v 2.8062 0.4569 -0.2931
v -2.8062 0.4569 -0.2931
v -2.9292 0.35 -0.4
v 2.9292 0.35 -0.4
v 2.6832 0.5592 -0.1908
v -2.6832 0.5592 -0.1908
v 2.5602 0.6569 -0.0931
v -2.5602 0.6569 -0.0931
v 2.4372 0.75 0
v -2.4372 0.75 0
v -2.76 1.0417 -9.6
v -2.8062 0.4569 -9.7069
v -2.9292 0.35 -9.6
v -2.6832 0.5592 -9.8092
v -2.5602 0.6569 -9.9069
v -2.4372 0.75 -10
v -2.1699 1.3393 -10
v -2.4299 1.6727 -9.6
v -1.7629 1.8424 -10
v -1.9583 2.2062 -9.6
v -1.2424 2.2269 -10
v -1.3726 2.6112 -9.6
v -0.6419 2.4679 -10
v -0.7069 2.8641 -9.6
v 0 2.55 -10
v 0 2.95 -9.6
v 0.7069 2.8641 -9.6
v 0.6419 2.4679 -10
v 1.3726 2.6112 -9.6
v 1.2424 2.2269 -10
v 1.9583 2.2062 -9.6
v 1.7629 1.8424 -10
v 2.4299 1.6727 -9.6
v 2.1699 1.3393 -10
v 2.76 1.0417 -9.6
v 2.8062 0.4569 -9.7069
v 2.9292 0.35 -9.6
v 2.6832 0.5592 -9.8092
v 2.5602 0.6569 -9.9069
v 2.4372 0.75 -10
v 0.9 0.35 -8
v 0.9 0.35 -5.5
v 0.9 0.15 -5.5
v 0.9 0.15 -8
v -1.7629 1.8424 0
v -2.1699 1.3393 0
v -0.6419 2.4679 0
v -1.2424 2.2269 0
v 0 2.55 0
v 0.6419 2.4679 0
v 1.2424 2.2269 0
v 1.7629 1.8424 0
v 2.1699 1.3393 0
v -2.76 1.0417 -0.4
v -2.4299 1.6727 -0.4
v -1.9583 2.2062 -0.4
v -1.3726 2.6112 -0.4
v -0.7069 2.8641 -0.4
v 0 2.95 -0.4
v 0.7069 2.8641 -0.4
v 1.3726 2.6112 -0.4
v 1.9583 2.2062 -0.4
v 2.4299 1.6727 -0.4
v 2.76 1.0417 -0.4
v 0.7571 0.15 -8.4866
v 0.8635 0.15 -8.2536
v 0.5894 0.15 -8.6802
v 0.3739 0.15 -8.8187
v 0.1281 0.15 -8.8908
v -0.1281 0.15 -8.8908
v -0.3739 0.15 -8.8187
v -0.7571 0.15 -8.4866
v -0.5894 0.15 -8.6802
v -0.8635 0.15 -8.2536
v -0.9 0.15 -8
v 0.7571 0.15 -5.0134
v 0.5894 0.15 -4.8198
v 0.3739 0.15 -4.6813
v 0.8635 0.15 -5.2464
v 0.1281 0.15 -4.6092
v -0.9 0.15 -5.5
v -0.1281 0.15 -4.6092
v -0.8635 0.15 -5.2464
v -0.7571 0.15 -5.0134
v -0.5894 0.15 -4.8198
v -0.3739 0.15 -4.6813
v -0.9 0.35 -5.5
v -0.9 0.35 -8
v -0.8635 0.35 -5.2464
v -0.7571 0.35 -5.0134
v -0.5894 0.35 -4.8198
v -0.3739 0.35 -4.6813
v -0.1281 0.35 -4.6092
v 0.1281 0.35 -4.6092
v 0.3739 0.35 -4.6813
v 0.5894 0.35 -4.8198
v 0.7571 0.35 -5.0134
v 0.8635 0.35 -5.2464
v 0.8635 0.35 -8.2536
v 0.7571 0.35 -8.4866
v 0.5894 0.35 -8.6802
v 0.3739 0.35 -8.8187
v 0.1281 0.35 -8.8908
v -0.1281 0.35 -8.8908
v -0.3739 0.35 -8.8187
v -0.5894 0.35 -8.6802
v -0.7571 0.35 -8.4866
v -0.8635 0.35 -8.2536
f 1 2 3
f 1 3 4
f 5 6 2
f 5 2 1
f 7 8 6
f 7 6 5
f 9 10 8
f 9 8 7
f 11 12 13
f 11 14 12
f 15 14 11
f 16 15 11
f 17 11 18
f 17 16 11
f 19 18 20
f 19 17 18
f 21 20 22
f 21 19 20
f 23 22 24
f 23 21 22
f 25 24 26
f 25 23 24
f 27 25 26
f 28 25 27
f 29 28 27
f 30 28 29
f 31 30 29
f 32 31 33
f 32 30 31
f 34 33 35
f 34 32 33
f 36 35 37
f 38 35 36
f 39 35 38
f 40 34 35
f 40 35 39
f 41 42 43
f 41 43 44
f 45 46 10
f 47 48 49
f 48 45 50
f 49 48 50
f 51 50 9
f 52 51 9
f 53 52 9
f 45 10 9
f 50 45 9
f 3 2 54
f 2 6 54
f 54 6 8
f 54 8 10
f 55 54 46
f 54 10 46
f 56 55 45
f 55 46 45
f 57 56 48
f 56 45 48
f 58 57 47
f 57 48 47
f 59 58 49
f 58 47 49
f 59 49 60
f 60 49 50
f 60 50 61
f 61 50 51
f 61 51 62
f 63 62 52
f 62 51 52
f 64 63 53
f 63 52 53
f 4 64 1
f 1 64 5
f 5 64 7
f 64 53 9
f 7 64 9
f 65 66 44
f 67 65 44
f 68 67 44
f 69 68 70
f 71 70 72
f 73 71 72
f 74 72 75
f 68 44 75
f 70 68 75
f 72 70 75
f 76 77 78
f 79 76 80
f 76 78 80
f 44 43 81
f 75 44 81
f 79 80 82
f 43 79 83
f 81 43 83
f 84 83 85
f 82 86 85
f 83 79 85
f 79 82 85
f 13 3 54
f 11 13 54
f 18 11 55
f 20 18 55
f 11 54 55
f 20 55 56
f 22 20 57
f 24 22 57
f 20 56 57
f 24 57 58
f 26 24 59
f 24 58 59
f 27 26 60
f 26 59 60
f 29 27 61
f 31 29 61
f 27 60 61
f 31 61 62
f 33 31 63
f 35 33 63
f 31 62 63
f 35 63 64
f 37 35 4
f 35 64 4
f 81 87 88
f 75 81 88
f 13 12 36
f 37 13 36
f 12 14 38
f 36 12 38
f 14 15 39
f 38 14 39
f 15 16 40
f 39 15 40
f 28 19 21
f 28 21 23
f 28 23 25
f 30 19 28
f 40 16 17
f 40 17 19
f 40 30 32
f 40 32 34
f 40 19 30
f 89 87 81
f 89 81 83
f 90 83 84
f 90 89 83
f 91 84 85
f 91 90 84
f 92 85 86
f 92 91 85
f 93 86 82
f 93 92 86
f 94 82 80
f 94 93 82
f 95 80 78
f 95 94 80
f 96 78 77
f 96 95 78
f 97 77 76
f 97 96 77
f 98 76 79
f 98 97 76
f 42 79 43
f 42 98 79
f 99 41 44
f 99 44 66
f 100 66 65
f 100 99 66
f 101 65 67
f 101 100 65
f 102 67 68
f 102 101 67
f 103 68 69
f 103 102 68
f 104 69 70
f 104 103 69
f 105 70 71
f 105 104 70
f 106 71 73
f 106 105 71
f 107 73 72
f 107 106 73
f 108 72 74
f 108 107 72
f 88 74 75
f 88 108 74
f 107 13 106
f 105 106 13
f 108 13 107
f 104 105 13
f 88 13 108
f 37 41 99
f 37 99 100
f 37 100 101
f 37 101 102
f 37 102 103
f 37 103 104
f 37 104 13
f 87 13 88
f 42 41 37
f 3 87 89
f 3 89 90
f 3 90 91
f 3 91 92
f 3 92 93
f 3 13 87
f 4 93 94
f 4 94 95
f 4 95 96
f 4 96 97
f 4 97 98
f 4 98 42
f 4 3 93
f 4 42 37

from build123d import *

# Parameters (mm, degrees)
PAD010_DEPTH    = 10
CHAMFER005_SIZE = 0.4
PAD011_DEPTH    = 0.2


with BuildPart() as body009:
    # Sketch023 → Pad010 (new body)
    with BuildSketch(Plane.XY):
        with BuildLine():
            ThreePointArc((-2.929164, -0.35), (0, -2.95), (2.929164, -0.35))
            Line((-2.929164, -0.35), (2.929164, -0.35))
        make_face()
    extrude(amount=-PAD010_DEPTH)

    # Chamfer005
    chamfer005_edges = [body009.edges().sort_by_distance(p)[0] for p in [
        (0, -2.95, 0),
        (0, -0.35, 0),
        (0, -2.95, -10),
        (0, -0.35, -10),
    ]]
    chamfer(chamfer005_edges, length=CHAMFER005_SIZE)

    # Sketch024 (on Face2 of Chamfer005) → Pad011 (join)
    with BuildSketch(Plane(origin=(0, -0.35, 0), x_dir=(-1, 0, 0), z_dir=(0, 1, 0))):
        with BuildLine():
            ThreePointArc((0.9, -5.5), (0, -4.6), (-0.9, -5.5))
            Line((-0.9, -5.5), (-0.9, -8))
            ThreePointArc((-0.9, -8), (0, -8.9), (0.9, -8))
            Line((0.9, -5.5), (0.9, -8))
        make_face()
    extrude(amount=PAD011_DEPTH)


with BuildPart() as holder2:
    # Part__Mirroring: instance of Body009
    add(body009.part.mirror(Plane(origin=(0, 0, 0), x_dir=(1, 0, 0), z_dir=(0, 1, 0))))


solid = holder2.part
